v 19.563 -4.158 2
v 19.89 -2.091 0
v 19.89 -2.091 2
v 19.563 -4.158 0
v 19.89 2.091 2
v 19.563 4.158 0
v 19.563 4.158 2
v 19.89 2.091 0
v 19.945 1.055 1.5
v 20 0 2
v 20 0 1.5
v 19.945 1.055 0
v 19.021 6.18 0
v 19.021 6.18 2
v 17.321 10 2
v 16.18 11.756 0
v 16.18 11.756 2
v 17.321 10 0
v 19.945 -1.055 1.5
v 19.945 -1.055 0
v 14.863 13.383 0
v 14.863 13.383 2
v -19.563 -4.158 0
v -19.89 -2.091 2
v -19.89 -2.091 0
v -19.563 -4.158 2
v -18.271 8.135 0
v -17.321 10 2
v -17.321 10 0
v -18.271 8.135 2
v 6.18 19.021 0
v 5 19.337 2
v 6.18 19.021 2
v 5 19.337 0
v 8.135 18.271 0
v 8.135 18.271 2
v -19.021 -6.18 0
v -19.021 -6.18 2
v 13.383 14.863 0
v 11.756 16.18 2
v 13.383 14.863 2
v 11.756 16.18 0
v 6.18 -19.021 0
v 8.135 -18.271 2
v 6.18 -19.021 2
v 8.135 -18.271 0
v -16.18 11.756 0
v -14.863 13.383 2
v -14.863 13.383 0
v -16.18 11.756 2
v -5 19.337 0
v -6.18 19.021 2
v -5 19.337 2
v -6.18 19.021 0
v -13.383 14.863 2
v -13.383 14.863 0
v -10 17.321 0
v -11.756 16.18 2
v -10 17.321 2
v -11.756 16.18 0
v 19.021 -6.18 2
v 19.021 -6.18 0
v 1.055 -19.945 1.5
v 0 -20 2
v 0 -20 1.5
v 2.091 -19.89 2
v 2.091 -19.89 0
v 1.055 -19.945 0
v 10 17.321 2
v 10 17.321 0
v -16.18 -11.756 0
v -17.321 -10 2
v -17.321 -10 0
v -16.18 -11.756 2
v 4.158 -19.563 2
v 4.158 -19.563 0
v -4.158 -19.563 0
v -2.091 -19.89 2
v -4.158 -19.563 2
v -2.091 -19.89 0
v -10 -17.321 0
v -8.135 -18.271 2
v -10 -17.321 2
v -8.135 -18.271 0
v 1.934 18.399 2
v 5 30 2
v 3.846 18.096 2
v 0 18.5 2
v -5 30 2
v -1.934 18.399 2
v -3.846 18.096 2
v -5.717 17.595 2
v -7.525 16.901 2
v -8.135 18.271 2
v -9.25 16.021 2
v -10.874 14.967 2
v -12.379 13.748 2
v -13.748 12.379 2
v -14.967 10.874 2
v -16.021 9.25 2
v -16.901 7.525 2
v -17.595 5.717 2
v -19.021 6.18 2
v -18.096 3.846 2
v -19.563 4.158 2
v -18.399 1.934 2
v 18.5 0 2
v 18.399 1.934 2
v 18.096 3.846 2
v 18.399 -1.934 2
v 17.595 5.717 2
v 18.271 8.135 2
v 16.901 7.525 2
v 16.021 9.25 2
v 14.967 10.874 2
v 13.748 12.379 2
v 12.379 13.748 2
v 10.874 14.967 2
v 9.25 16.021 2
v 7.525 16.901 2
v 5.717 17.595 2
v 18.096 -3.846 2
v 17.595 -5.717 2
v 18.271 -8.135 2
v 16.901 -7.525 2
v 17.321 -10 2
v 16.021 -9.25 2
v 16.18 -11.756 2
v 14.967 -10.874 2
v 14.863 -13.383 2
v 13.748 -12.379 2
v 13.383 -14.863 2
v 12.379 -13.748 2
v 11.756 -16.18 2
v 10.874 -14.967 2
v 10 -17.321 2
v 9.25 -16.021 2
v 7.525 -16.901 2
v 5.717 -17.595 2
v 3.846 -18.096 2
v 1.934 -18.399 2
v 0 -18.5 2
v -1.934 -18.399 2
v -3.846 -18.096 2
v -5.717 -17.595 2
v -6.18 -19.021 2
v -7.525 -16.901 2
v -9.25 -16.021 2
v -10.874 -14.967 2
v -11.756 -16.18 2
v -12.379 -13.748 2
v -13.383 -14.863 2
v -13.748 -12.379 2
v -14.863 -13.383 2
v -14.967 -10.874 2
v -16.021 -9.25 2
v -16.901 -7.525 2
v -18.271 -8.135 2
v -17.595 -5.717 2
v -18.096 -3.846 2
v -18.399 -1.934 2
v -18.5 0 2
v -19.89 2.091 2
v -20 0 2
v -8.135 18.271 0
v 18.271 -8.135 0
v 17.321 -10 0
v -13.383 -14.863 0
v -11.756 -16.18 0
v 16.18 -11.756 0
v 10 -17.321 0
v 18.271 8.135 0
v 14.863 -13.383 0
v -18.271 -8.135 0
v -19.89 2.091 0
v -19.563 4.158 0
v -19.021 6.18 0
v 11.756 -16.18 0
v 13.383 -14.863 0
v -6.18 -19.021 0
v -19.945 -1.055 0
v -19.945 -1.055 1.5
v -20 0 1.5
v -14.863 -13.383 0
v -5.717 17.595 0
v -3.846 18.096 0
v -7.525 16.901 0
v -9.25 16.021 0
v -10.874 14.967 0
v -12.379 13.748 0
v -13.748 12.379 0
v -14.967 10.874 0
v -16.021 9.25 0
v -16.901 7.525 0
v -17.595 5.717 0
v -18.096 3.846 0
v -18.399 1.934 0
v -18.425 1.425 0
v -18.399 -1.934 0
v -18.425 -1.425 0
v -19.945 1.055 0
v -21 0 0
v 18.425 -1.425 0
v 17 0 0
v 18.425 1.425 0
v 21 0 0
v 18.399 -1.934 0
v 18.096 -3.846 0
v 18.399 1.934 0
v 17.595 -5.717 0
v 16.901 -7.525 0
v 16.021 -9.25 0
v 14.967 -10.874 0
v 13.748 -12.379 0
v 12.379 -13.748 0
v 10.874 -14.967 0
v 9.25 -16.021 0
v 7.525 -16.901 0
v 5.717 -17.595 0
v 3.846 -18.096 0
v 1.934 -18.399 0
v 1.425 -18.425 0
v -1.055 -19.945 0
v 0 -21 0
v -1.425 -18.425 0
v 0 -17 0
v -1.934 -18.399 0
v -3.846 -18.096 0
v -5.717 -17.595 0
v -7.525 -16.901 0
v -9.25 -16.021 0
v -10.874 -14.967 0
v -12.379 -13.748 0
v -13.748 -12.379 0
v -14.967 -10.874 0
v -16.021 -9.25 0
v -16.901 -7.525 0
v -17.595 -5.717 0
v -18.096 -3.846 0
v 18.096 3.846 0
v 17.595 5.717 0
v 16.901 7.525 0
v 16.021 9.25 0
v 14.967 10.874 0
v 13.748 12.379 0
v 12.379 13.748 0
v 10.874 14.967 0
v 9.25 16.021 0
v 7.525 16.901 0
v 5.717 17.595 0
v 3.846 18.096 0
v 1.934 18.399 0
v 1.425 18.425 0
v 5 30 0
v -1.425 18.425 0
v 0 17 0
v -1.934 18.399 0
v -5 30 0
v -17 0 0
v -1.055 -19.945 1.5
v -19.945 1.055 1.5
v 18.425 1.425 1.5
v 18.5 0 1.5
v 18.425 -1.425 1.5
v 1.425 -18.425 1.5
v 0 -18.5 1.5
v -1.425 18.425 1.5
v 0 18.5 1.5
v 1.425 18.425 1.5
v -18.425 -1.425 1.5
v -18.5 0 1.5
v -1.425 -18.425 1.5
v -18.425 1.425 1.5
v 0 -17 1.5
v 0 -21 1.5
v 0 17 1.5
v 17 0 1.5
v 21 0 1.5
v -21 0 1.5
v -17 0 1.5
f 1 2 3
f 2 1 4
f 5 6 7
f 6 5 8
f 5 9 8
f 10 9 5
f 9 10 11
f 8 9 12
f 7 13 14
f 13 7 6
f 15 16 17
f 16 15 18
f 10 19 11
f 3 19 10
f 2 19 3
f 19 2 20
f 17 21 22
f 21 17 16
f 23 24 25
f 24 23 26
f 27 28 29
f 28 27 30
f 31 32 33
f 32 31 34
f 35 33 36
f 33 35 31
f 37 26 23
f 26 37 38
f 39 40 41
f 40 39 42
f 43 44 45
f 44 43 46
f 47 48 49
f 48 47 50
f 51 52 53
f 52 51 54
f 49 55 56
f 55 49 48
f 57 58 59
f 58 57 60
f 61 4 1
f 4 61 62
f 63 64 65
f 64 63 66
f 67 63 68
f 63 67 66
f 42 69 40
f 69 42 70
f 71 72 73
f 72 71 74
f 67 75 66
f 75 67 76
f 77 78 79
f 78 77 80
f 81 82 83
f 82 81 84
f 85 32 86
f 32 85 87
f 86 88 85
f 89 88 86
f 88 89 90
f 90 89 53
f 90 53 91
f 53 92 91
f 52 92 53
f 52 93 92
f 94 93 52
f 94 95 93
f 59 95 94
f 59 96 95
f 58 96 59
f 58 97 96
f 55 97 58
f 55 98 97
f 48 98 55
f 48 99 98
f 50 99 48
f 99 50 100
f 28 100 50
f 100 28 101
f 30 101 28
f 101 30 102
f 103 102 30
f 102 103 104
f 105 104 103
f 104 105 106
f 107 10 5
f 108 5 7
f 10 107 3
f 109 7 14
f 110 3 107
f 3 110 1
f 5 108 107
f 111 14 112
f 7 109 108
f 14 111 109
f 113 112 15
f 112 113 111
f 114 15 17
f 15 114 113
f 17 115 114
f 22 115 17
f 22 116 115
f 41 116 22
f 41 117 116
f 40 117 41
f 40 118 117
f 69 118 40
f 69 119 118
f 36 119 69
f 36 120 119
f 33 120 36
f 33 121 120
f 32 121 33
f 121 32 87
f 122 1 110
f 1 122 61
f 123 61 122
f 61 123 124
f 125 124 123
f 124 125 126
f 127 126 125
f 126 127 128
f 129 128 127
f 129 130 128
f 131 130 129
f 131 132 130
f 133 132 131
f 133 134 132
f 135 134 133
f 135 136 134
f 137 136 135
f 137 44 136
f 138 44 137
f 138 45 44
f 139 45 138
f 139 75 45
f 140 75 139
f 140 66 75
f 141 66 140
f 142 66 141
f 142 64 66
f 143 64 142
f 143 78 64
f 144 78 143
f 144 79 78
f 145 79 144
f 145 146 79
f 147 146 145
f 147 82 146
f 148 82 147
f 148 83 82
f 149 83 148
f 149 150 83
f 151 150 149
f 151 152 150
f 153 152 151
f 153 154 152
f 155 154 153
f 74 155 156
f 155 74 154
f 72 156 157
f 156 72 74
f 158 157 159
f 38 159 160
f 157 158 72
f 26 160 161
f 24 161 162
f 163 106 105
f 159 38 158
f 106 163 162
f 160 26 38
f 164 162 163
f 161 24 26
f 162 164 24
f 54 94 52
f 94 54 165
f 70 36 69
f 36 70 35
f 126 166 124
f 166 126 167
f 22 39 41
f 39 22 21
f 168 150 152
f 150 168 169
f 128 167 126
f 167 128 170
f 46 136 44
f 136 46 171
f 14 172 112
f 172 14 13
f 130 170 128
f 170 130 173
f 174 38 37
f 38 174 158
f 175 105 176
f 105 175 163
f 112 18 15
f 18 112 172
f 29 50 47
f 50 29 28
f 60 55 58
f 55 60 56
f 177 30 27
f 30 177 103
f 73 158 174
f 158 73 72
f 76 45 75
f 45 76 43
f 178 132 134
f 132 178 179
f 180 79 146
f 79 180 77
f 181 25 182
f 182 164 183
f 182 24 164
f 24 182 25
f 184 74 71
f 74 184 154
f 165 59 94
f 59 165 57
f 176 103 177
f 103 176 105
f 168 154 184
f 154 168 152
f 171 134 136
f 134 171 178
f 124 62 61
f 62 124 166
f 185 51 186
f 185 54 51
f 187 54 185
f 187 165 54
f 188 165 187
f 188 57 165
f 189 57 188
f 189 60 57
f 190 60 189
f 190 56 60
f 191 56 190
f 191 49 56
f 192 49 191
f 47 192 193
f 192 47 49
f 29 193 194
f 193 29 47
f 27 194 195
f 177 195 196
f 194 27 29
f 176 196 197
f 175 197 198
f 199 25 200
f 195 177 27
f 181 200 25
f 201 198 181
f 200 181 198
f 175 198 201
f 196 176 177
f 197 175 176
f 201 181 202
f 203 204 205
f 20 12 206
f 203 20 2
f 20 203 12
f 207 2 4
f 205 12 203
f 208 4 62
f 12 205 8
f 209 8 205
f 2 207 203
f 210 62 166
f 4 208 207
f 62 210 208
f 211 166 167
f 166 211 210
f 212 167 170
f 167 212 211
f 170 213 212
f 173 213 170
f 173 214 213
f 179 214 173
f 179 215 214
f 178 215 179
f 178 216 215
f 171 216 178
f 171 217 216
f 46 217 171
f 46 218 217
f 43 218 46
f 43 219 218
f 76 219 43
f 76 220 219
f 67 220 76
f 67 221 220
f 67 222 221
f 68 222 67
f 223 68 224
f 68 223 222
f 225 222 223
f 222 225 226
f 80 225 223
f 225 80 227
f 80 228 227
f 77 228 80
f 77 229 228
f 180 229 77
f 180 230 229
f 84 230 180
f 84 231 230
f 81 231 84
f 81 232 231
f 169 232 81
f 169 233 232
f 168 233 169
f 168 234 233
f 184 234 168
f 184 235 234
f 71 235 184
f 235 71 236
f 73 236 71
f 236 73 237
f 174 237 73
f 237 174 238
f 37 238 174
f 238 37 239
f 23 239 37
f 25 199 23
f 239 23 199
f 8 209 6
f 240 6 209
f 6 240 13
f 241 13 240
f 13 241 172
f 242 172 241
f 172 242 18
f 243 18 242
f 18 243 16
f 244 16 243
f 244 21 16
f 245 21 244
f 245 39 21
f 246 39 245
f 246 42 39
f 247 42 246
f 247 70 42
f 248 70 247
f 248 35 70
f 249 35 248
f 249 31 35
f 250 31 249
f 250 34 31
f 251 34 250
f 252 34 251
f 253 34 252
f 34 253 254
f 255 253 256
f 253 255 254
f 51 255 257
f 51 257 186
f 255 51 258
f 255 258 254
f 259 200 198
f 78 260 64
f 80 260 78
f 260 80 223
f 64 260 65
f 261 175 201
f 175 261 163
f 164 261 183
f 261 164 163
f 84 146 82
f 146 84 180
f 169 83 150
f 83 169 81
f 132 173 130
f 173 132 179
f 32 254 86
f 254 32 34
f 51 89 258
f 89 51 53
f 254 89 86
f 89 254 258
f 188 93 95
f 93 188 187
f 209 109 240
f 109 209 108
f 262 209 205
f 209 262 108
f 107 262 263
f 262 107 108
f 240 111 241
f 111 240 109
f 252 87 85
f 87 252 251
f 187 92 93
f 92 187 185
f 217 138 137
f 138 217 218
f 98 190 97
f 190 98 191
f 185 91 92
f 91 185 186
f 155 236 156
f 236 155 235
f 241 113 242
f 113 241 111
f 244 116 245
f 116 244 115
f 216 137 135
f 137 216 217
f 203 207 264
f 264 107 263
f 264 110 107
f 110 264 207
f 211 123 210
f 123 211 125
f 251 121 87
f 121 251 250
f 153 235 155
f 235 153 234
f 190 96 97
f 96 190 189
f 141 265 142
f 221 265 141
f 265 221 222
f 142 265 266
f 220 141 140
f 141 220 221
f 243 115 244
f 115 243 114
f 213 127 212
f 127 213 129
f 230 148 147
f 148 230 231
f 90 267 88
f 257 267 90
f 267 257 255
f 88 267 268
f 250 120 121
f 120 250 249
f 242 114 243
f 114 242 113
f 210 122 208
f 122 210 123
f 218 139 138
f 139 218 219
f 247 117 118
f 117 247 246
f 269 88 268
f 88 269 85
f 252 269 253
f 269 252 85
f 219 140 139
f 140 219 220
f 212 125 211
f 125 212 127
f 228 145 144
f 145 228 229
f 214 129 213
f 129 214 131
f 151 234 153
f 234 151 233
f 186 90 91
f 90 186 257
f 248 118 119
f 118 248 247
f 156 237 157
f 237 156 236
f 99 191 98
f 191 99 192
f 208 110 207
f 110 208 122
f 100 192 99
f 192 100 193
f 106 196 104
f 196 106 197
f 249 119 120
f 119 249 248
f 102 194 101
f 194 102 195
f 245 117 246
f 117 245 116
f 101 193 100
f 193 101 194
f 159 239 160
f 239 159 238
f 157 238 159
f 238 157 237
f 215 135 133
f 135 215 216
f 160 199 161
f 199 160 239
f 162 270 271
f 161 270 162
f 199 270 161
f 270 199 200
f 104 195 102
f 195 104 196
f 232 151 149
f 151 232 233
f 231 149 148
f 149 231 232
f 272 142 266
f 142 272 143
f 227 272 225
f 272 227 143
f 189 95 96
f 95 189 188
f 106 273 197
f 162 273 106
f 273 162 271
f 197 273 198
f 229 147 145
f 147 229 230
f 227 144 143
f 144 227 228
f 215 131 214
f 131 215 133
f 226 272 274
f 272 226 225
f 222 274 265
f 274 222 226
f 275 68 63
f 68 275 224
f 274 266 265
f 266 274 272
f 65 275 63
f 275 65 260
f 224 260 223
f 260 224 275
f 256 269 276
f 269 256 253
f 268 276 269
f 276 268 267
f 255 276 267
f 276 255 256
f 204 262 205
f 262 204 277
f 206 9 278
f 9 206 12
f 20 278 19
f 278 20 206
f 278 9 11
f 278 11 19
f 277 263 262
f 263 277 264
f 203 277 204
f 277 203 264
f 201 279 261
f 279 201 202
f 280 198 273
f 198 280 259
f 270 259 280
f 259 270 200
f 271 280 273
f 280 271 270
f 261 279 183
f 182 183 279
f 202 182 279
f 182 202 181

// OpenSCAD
$fn=60;
difference()
{
union()
{
translate([0,0,])cylinder(d=40,h=2);
translate([-5,0,0]) cube([10,30,2]);
}
translate([0,0,-1])cylinder (d=37,h=5);
}


translate([0,-19,0])cylinder (d=4,h=1.5,$fn=4);
translate([0,19,0])cylinder (d=4,h=1.5,$fn=4);
translate([19,0,0])cylinder (d=4,h=1.5,$fn=4);
translate([-19,0,0])cylinder (d=4,h=1.5,$fn=4);
